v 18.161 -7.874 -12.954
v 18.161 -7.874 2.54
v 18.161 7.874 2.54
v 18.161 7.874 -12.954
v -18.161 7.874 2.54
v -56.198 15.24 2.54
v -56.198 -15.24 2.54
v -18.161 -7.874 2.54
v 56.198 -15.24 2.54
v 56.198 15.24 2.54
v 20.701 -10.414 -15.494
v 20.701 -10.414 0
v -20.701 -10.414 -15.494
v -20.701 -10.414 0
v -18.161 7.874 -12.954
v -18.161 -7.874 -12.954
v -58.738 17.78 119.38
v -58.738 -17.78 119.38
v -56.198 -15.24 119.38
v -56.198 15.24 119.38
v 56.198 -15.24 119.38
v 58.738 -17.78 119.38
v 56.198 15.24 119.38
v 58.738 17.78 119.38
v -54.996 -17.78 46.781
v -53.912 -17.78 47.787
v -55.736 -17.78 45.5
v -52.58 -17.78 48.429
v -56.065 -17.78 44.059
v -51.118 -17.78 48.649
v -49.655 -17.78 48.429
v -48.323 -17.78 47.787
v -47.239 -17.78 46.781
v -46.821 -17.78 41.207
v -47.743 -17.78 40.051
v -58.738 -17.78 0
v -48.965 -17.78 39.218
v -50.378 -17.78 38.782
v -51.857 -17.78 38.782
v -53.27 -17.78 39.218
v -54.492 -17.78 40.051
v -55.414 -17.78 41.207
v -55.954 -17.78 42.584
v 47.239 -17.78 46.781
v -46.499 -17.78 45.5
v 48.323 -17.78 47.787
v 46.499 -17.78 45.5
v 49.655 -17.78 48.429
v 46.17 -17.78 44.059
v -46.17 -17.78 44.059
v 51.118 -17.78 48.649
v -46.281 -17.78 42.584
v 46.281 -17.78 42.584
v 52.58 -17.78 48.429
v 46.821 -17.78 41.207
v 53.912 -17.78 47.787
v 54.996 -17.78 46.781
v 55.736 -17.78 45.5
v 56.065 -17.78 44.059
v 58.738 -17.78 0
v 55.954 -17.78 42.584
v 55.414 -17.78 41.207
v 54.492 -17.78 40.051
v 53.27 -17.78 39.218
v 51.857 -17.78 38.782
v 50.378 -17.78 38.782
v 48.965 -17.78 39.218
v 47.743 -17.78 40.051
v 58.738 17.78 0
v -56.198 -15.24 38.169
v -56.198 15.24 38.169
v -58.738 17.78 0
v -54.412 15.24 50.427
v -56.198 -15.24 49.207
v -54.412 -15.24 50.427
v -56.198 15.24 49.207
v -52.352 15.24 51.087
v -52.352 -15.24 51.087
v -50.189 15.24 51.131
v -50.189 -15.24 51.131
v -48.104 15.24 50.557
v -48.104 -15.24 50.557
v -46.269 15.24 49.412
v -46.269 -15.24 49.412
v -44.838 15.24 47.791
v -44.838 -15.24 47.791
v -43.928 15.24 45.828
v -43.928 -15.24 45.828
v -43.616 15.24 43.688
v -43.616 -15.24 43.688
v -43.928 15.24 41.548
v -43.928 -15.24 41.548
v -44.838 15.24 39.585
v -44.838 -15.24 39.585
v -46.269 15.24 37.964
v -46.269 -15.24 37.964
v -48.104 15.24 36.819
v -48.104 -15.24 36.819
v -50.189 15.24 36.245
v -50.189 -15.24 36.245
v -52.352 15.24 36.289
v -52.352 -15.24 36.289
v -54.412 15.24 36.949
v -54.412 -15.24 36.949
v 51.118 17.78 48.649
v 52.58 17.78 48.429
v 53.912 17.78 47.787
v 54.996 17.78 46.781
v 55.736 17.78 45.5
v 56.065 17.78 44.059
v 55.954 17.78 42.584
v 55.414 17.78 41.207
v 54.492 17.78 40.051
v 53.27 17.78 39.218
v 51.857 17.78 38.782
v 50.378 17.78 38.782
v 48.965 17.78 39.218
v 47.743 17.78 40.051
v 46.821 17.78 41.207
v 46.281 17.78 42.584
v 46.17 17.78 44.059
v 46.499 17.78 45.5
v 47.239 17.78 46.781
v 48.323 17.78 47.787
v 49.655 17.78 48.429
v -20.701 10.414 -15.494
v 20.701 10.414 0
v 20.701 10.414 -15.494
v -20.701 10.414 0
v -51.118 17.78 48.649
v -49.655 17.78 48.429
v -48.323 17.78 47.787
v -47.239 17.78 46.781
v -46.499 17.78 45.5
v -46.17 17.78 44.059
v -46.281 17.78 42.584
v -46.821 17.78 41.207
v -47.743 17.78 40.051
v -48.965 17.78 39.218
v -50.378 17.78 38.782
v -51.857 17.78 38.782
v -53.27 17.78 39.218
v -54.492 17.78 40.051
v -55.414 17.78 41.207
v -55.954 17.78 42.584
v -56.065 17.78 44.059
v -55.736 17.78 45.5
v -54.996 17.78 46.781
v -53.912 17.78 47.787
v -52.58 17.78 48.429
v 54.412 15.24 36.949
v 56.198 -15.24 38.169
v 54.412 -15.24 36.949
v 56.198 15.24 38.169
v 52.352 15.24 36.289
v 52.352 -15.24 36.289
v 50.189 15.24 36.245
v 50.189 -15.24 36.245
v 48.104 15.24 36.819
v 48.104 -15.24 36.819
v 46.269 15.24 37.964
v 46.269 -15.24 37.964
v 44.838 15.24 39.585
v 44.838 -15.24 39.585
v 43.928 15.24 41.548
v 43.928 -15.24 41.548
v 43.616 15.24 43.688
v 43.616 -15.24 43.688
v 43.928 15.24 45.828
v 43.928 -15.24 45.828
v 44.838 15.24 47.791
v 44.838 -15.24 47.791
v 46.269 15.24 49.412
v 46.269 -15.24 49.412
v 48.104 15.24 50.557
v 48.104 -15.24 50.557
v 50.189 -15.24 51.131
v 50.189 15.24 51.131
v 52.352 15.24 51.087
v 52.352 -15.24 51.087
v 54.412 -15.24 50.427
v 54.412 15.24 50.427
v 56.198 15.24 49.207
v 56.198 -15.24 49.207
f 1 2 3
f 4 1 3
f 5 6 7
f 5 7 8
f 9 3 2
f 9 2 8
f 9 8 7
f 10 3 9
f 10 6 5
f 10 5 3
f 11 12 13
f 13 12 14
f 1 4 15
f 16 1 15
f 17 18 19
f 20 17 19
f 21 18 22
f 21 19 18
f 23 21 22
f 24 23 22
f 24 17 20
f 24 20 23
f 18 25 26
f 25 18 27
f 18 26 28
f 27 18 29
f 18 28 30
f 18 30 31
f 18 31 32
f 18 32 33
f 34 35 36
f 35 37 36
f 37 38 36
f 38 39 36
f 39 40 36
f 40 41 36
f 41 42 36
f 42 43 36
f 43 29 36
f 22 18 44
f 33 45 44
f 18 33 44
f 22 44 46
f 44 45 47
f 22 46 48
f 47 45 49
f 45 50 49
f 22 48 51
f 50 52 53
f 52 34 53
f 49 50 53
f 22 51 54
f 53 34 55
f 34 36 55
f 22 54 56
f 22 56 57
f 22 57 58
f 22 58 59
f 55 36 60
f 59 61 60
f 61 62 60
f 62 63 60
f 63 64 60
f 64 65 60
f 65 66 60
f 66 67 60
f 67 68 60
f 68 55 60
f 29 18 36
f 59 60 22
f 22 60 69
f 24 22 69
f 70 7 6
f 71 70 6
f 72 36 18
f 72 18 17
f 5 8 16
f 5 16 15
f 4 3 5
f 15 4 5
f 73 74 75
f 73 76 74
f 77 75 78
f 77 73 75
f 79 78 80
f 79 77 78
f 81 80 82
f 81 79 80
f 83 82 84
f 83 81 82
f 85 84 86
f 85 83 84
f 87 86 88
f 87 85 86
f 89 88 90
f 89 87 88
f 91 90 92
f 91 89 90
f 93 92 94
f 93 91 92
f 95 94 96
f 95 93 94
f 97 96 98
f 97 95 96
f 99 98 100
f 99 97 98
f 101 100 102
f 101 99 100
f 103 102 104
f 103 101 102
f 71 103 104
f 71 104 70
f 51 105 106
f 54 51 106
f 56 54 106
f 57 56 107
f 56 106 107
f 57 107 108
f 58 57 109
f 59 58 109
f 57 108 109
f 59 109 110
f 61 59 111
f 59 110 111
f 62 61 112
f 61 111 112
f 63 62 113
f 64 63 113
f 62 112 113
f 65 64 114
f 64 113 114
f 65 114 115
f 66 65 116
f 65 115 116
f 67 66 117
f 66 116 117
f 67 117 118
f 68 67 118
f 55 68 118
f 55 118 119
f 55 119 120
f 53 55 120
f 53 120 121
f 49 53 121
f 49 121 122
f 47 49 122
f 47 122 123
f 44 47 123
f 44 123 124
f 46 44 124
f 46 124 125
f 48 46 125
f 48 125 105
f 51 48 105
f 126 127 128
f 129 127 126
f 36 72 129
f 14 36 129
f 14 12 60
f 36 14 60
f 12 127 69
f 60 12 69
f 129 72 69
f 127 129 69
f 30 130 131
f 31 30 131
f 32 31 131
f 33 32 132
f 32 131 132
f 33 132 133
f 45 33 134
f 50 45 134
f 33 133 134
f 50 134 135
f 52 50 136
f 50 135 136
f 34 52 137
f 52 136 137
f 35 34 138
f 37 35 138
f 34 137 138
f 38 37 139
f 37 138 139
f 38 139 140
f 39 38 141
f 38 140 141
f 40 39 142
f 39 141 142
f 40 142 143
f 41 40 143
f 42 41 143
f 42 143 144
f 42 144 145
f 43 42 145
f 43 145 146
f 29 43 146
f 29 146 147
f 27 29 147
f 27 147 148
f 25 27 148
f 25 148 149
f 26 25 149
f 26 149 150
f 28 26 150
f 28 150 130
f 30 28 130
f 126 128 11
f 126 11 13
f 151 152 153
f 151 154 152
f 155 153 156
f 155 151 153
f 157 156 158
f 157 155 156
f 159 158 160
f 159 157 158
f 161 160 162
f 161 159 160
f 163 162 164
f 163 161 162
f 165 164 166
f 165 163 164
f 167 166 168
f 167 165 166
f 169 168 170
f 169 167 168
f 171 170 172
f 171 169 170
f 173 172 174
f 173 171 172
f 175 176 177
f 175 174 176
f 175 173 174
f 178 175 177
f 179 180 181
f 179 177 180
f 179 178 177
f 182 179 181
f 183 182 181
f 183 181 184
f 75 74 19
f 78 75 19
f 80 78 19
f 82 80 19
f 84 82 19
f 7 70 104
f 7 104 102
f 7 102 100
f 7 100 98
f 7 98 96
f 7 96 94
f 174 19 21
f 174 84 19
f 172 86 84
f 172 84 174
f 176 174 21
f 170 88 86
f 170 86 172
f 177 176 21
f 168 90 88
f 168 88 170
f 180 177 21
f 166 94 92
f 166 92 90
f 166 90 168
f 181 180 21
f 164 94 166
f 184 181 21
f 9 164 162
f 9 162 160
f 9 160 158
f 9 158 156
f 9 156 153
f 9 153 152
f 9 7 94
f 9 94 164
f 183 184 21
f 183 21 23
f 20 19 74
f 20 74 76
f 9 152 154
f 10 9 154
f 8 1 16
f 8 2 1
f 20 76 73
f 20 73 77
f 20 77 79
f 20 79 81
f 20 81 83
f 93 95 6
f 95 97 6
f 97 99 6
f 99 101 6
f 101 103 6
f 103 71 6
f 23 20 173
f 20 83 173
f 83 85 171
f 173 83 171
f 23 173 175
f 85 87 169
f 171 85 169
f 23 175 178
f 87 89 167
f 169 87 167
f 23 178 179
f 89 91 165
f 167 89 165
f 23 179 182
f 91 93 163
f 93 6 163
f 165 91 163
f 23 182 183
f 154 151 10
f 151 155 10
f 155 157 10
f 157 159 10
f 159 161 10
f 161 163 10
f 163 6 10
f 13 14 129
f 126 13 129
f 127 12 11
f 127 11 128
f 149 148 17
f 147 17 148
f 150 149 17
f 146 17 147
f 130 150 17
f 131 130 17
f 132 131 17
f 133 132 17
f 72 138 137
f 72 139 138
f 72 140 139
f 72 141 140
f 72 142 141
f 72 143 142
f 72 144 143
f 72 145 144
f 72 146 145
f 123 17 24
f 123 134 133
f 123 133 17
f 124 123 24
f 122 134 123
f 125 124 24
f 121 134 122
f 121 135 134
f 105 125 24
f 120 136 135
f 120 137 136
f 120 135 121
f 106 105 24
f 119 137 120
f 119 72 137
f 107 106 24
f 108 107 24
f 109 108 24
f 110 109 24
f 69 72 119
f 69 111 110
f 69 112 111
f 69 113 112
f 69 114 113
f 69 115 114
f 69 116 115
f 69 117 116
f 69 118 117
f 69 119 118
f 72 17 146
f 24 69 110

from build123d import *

# Parameters (mm, degrees)
SKETCH1_W                        = 117.475
SKETCH1_H                        = 35.56
EXTRUDE1_DEPTH                   = 119.38
SKETCH2_W                        = 41.402
SKETCH2_H                        = 20.828
EXTRUDE2_DEPTH                   = 15.494
F_25_64_0_39063_DIAMETER_HOLE1_D = 9.922002
SHELL1_T                         = -2.54


with BuildPart() as part:
    # Sketch1 → Extrude1 (new body)
    with BuildSketch(Plane.XY):
        Rectangle(SKETCH1_W, SKETCH1_H)
    extrude(amount=EXTRUDE1_DEPTH)

    # Sketch2 → Extrude2 (add)
    with BuildSketch(Plane(origin=(0, 0, 0), x_dir=(-1, 0, 0), z_dir=(0, 0, -1))):
        Rectangle(SKETCH2_W, SKETCH2_H)
    extrude(amount=EXTRUDE2_DEPTH)

    # 25/64 (0.39063) Diameter Hole1 (through all)
    with Locations(Plane(origin=(-51.1175, -17.78, 43.688), x_dir=(0, 0, -1), z_dir=(0, -1, 0))):
        with Locations((0, 0), (0, 102.235)):
            Hole(F_25_64_0_39063_DIAMETER_HOLE1_D / 2)

    # Shell1
    shell1_openings = [part.faces().sort_by_distance(p)[0] for p in [
        (0, 0, 119.38),
    ]]
    offset(amount=SHELL1_T, openings=shell1_openings, kind=Kind.INTERSECTION)


solid = part.part
